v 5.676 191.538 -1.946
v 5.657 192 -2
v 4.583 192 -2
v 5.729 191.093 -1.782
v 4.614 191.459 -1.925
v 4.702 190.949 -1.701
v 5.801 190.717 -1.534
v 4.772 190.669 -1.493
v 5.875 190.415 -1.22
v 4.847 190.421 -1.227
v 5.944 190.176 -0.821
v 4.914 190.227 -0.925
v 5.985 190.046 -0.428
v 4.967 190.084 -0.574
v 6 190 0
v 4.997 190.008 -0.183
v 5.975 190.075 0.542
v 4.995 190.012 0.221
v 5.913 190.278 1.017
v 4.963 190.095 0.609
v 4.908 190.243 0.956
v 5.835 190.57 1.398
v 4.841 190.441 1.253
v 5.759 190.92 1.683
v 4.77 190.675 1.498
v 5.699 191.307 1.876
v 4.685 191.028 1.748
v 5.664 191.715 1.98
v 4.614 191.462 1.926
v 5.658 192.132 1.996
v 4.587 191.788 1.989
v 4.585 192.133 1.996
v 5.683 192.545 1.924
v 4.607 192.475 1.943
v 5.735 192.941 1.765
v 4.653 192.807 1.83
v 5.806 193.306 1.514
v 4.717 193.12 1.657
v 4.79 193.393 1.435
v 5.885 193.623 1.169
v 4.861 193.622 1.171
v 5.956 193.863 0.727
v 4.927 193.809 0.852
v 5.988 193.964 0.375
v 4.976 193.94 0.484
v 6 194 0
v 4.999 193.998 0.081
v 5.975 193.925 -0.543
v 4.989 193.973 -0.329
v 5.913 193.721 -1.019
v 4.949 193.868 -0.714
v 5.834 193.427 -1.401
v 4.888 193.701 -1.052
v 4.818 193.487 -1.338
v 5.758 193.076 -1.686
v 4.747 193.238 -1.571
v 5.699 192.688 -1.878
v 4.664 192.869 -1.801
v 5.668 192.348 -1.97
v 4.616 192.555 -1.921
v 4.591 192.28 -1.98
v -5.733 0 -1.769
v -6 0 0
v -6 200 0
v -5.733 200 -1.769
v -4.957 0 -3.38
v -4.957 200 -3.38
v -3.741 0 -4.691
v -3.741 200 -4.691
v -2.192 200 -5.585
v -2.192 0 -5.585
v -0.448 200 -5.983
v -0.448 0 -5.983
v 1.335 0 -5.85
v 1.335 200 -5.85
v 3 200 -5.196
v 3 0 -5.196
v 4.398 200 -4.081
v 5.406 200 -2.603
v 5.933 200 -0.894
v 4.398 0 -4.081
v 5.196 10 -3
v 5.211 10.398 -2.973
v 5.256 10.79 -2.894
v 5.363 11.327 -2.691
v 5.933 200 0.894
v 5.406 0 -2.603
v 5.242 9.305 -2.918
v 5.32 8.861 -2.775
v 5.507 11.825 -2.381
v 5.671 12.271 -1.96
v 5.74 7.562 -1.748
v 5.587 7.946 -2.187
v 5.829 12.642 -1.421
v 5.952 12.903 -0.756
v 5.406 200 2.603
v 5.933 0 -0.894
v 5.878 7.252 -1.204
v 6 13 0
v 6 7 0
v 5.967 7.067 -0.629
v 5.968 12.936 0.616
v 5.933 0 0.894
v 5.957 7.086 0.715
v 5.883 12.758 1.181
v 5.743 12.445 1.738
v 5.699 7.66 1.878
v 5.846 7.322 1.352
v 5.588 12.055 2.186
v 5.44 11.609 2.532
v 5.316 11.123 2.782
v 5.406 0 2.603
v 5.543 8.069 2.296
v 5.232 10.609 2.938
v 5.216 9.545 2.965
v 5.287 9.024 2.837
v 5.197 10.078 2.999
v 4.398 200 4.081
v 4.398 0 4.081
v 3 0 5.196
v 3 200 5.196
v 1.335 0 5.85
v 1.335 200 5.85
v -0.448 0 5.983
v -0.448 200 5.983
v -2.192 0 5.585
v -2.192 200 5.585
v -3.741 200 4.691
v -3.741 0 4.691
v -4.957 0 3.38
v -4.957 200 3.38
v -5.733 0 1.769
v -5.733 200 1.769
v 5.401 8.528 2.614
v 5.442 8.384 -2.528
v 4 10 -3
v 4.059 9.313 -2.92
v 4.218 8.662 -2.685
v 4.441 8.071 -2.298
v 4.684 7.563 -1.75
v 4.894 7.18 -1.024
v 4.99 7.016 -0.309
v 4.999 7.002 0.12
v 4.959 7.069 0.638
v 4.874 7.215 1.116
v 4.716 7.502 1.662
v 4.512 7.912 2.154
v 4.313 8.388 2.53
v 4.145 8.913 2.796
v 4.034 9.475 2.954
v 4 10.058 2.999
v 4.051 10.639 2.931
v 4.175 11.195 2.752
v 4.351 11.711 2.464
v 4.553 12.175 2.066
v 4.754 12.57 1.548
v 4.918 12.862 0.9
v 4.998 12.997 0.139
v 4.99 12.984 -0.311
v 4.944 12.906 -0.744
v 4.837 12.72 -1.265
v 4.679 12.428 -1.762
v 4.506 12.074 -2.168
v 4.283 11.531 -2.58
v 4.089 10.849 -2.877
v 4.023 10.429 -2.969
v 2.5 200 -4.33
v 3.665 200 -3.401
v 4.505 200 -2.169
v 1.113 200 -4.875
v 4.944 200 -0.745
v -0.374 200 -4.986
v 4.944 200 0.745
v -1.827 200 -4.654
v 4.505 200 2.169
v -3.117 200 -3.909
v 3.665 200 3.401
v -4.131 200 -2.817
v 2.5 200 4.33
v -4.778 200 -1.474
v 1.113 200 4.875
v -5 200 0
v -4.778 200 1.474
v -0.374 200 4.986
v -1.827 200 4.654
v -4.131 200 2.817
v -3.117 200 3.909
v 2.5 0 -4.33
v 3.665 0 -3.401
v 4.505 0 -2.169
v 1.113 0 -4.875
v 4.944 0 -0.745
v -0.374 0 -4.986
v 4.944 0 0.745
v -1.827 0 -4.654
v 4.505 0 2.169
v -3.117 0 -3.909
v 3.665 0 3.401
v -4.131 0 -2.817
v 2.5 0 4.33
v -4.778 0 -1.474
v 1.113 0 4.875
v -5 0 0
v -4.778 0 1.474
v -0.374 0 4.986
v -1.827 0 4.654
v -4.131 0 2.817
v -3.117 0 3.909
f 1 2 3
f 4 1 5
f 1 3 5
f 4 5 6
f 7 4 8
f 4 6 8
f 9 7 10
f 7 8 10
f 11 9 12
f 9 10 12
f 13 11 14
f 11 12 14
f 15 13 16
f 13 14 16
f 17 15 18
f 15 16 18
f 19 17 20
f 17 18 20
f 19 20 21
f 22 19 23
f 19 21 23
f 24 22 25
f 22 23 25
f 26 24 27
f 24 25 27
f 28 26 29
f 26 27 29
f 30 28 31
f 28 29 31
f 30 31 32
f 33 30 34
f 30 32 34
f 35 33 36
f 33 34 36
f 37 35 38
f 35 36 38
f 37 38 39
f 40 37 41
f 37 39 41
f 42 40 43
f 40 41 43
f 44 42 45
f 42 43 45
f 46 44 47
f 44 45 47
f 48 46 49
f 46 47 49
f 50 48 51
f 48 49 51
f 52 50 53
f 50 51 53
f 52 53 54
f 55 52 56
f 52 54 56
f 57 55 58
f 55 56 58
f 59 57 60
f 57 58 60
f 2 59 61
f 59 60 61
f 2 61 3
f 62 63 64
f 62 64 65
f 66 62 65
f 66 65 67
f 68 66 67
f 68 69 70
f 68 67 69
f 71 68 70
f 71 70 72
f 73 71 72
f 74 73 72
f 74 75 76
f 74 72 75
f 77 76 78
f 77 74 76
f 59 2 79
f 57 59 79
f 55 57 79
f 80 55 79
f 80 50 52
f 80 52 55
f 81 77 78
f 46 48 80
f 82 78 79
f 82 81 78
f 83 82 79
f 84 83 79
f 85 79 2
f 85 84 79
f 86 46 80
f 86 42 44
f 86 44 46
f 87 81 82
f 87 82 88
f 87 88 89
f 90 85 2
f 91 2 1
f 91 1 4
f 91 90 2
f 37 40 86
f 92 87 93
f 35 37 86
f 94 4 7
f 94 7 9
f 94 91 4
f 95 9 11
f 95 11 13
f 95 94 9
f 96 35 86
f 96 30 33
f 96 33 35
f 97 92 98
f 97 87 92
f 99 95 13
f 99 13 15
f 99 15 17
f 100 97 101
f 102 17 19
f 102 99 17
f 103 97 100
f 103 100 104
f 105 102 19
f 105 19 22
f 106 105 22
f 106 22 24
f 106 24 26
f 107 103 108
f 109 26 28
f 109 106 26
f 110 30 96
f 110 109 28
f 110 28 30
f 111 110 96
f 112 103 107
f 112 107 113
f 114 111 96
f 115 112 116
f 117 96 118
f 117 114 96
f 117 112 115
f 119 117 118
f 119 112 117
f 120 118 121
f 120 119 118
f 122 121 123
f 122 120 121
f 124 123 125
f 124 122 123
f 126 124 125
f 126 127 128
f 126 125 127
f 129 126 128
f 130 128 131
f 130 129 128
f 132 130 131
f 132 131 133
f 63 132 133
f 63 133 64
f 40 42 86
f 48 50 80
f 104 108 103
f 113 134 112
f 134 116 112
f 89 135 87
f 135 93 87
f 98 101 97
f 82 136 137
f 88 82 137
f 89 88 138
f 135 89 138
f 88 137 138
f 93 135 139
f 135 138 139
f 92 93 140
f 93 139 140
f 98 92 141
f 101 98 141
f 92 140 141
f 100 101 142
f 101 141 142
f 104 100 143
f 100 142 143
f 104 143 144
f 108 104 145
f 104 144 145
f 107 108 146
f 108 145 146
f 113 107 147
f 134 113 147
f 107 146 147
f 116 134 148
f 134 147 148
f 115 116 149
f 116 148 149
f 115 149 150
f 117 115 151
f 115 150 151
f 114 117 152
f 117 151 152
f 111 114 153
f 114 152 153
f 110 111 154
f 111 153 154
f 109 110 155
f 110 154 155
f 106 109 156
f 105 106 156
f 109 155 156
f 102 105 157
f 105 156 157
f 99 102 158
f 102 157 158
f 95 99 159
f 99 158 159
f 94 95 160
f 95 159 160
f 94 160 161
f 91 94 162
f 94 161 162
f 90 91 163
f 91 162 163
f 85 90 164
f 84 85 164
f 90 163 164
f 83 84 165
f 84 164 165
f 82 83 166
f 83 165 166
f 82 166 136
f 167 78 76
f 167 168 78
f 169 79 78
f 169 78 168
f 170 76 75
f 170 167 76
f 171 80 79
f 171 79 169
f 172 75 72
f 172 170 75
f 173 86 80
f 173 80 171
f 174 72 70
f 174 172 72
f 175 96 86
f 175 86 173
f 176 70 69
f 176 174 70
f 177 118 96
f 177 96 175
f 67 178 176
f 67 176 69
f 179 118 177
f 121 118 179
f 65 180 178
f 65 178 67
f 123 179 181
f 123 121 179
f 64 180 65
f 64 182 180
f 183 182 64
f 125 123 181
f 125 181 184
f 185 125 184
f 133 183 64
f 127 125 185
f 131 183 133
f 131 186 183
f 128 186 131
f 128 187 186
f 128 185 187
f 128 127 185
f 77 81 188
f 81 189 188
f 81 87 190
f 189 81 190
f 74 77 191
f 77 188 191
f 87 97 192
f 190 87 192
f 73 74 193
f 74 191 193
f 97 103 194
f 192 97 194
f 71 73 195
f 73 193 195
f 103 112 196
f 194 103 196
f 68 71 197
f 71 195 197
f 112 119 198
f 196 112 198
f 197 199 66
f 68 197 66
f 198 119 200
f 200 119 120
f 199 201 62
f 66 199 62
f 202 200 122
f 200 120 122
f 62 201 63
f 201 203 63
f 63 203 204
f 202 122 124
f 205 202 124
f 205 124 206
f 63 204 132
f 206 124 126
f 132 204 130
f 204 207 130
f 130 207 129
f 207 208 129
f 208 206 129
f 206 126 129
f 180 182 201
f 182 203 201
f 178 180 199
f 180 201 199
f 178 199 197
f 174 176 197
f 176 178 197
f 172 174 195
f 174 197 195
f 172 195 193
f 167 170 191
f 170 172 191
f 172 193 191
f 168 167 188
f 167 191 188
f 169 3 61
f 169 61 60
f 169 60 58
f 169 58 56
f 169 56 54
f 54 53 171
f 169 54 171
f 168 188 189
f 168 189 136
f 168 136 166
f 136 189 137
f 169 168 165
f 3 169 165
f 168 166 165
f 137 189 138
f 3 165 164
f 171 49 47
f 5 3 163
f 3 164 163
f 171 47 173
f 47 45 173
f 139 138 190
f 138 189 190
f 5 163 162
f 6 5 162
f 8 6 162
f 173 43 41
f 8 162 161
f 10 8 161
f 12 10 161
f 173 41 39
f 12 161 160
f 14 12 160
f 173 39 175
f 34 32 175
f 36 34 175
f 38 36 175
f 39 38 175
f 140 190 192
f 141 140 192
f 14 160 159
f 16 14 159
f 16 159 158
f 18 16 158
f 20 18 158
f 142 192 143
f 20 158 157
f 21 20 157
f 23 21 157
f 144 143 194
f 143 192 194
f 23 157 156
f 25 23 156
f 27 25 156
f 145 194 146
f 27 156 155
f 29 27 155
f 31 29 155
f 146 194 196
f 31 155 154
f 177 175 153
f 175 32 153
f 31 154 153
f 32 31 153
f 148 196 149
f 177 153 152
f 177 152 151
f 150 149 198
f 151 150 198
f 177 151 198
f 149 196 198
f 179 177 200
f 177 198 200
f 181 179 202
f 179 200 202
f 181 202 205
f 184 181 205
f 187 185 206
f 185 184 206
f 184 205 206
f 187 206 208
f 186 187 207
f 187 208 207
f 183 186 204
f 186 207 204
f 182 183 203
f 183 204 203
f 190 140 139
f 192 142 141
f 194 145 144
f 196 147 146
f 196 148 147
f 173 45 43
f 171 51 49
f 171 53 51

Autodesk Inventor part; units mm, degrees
ref_plane "XZ Plane" through (0, 0, 0) normal (0, 1, 0) x (-1, 0, 0)
ref_plane "XY Plane" through (0, 0, 0) normal (0, 0, 1) x (1, 0, 0)
sketch "Sketch1" plane through (0, 0, 0) normal (0, 1, 0) x (-1, 0, 0)
  circle A0 centre (0, 0) radius 5
  circle A1 centre (0, 0) radius 6
  dimension "d0" = 12
  dimension "d1" = 1
extrude "Extrusion1" add sketch "Sketch1" along normal blind 200
ref_plane "Work Plane3" through (6, 0, 0) normal (1, 0, 0) x (0, 1, 0)
sketch "Sketch2" plane through (6, 0, 0) normal (1, 0, 0) x (0, 1, 0)
  line L0 (0, -6) -> (200, -6) projected
  line L1 (0, 6) -> (200, 6) projected
  line L2 (200, -6) -> (200, 6) projected
  line L3 (-40, 0) -> (240, 0) projected
  point P0 (0, 0)
  point P1 (10, 0)
  point P2 (192, 0)
hole "Hole1" at (6, 10, 0) direction (-1, 0, 0) diameter 6 end up to surface
hole "Hole2" at (6, 192, 0) direction (-1, 0, 0) diameter 4 end up to surface
equation "\"d2\" = pipe_length"
equation "\"pipe_length\" = 200"
properties part number "pipe" material "Aluminum 6061"
